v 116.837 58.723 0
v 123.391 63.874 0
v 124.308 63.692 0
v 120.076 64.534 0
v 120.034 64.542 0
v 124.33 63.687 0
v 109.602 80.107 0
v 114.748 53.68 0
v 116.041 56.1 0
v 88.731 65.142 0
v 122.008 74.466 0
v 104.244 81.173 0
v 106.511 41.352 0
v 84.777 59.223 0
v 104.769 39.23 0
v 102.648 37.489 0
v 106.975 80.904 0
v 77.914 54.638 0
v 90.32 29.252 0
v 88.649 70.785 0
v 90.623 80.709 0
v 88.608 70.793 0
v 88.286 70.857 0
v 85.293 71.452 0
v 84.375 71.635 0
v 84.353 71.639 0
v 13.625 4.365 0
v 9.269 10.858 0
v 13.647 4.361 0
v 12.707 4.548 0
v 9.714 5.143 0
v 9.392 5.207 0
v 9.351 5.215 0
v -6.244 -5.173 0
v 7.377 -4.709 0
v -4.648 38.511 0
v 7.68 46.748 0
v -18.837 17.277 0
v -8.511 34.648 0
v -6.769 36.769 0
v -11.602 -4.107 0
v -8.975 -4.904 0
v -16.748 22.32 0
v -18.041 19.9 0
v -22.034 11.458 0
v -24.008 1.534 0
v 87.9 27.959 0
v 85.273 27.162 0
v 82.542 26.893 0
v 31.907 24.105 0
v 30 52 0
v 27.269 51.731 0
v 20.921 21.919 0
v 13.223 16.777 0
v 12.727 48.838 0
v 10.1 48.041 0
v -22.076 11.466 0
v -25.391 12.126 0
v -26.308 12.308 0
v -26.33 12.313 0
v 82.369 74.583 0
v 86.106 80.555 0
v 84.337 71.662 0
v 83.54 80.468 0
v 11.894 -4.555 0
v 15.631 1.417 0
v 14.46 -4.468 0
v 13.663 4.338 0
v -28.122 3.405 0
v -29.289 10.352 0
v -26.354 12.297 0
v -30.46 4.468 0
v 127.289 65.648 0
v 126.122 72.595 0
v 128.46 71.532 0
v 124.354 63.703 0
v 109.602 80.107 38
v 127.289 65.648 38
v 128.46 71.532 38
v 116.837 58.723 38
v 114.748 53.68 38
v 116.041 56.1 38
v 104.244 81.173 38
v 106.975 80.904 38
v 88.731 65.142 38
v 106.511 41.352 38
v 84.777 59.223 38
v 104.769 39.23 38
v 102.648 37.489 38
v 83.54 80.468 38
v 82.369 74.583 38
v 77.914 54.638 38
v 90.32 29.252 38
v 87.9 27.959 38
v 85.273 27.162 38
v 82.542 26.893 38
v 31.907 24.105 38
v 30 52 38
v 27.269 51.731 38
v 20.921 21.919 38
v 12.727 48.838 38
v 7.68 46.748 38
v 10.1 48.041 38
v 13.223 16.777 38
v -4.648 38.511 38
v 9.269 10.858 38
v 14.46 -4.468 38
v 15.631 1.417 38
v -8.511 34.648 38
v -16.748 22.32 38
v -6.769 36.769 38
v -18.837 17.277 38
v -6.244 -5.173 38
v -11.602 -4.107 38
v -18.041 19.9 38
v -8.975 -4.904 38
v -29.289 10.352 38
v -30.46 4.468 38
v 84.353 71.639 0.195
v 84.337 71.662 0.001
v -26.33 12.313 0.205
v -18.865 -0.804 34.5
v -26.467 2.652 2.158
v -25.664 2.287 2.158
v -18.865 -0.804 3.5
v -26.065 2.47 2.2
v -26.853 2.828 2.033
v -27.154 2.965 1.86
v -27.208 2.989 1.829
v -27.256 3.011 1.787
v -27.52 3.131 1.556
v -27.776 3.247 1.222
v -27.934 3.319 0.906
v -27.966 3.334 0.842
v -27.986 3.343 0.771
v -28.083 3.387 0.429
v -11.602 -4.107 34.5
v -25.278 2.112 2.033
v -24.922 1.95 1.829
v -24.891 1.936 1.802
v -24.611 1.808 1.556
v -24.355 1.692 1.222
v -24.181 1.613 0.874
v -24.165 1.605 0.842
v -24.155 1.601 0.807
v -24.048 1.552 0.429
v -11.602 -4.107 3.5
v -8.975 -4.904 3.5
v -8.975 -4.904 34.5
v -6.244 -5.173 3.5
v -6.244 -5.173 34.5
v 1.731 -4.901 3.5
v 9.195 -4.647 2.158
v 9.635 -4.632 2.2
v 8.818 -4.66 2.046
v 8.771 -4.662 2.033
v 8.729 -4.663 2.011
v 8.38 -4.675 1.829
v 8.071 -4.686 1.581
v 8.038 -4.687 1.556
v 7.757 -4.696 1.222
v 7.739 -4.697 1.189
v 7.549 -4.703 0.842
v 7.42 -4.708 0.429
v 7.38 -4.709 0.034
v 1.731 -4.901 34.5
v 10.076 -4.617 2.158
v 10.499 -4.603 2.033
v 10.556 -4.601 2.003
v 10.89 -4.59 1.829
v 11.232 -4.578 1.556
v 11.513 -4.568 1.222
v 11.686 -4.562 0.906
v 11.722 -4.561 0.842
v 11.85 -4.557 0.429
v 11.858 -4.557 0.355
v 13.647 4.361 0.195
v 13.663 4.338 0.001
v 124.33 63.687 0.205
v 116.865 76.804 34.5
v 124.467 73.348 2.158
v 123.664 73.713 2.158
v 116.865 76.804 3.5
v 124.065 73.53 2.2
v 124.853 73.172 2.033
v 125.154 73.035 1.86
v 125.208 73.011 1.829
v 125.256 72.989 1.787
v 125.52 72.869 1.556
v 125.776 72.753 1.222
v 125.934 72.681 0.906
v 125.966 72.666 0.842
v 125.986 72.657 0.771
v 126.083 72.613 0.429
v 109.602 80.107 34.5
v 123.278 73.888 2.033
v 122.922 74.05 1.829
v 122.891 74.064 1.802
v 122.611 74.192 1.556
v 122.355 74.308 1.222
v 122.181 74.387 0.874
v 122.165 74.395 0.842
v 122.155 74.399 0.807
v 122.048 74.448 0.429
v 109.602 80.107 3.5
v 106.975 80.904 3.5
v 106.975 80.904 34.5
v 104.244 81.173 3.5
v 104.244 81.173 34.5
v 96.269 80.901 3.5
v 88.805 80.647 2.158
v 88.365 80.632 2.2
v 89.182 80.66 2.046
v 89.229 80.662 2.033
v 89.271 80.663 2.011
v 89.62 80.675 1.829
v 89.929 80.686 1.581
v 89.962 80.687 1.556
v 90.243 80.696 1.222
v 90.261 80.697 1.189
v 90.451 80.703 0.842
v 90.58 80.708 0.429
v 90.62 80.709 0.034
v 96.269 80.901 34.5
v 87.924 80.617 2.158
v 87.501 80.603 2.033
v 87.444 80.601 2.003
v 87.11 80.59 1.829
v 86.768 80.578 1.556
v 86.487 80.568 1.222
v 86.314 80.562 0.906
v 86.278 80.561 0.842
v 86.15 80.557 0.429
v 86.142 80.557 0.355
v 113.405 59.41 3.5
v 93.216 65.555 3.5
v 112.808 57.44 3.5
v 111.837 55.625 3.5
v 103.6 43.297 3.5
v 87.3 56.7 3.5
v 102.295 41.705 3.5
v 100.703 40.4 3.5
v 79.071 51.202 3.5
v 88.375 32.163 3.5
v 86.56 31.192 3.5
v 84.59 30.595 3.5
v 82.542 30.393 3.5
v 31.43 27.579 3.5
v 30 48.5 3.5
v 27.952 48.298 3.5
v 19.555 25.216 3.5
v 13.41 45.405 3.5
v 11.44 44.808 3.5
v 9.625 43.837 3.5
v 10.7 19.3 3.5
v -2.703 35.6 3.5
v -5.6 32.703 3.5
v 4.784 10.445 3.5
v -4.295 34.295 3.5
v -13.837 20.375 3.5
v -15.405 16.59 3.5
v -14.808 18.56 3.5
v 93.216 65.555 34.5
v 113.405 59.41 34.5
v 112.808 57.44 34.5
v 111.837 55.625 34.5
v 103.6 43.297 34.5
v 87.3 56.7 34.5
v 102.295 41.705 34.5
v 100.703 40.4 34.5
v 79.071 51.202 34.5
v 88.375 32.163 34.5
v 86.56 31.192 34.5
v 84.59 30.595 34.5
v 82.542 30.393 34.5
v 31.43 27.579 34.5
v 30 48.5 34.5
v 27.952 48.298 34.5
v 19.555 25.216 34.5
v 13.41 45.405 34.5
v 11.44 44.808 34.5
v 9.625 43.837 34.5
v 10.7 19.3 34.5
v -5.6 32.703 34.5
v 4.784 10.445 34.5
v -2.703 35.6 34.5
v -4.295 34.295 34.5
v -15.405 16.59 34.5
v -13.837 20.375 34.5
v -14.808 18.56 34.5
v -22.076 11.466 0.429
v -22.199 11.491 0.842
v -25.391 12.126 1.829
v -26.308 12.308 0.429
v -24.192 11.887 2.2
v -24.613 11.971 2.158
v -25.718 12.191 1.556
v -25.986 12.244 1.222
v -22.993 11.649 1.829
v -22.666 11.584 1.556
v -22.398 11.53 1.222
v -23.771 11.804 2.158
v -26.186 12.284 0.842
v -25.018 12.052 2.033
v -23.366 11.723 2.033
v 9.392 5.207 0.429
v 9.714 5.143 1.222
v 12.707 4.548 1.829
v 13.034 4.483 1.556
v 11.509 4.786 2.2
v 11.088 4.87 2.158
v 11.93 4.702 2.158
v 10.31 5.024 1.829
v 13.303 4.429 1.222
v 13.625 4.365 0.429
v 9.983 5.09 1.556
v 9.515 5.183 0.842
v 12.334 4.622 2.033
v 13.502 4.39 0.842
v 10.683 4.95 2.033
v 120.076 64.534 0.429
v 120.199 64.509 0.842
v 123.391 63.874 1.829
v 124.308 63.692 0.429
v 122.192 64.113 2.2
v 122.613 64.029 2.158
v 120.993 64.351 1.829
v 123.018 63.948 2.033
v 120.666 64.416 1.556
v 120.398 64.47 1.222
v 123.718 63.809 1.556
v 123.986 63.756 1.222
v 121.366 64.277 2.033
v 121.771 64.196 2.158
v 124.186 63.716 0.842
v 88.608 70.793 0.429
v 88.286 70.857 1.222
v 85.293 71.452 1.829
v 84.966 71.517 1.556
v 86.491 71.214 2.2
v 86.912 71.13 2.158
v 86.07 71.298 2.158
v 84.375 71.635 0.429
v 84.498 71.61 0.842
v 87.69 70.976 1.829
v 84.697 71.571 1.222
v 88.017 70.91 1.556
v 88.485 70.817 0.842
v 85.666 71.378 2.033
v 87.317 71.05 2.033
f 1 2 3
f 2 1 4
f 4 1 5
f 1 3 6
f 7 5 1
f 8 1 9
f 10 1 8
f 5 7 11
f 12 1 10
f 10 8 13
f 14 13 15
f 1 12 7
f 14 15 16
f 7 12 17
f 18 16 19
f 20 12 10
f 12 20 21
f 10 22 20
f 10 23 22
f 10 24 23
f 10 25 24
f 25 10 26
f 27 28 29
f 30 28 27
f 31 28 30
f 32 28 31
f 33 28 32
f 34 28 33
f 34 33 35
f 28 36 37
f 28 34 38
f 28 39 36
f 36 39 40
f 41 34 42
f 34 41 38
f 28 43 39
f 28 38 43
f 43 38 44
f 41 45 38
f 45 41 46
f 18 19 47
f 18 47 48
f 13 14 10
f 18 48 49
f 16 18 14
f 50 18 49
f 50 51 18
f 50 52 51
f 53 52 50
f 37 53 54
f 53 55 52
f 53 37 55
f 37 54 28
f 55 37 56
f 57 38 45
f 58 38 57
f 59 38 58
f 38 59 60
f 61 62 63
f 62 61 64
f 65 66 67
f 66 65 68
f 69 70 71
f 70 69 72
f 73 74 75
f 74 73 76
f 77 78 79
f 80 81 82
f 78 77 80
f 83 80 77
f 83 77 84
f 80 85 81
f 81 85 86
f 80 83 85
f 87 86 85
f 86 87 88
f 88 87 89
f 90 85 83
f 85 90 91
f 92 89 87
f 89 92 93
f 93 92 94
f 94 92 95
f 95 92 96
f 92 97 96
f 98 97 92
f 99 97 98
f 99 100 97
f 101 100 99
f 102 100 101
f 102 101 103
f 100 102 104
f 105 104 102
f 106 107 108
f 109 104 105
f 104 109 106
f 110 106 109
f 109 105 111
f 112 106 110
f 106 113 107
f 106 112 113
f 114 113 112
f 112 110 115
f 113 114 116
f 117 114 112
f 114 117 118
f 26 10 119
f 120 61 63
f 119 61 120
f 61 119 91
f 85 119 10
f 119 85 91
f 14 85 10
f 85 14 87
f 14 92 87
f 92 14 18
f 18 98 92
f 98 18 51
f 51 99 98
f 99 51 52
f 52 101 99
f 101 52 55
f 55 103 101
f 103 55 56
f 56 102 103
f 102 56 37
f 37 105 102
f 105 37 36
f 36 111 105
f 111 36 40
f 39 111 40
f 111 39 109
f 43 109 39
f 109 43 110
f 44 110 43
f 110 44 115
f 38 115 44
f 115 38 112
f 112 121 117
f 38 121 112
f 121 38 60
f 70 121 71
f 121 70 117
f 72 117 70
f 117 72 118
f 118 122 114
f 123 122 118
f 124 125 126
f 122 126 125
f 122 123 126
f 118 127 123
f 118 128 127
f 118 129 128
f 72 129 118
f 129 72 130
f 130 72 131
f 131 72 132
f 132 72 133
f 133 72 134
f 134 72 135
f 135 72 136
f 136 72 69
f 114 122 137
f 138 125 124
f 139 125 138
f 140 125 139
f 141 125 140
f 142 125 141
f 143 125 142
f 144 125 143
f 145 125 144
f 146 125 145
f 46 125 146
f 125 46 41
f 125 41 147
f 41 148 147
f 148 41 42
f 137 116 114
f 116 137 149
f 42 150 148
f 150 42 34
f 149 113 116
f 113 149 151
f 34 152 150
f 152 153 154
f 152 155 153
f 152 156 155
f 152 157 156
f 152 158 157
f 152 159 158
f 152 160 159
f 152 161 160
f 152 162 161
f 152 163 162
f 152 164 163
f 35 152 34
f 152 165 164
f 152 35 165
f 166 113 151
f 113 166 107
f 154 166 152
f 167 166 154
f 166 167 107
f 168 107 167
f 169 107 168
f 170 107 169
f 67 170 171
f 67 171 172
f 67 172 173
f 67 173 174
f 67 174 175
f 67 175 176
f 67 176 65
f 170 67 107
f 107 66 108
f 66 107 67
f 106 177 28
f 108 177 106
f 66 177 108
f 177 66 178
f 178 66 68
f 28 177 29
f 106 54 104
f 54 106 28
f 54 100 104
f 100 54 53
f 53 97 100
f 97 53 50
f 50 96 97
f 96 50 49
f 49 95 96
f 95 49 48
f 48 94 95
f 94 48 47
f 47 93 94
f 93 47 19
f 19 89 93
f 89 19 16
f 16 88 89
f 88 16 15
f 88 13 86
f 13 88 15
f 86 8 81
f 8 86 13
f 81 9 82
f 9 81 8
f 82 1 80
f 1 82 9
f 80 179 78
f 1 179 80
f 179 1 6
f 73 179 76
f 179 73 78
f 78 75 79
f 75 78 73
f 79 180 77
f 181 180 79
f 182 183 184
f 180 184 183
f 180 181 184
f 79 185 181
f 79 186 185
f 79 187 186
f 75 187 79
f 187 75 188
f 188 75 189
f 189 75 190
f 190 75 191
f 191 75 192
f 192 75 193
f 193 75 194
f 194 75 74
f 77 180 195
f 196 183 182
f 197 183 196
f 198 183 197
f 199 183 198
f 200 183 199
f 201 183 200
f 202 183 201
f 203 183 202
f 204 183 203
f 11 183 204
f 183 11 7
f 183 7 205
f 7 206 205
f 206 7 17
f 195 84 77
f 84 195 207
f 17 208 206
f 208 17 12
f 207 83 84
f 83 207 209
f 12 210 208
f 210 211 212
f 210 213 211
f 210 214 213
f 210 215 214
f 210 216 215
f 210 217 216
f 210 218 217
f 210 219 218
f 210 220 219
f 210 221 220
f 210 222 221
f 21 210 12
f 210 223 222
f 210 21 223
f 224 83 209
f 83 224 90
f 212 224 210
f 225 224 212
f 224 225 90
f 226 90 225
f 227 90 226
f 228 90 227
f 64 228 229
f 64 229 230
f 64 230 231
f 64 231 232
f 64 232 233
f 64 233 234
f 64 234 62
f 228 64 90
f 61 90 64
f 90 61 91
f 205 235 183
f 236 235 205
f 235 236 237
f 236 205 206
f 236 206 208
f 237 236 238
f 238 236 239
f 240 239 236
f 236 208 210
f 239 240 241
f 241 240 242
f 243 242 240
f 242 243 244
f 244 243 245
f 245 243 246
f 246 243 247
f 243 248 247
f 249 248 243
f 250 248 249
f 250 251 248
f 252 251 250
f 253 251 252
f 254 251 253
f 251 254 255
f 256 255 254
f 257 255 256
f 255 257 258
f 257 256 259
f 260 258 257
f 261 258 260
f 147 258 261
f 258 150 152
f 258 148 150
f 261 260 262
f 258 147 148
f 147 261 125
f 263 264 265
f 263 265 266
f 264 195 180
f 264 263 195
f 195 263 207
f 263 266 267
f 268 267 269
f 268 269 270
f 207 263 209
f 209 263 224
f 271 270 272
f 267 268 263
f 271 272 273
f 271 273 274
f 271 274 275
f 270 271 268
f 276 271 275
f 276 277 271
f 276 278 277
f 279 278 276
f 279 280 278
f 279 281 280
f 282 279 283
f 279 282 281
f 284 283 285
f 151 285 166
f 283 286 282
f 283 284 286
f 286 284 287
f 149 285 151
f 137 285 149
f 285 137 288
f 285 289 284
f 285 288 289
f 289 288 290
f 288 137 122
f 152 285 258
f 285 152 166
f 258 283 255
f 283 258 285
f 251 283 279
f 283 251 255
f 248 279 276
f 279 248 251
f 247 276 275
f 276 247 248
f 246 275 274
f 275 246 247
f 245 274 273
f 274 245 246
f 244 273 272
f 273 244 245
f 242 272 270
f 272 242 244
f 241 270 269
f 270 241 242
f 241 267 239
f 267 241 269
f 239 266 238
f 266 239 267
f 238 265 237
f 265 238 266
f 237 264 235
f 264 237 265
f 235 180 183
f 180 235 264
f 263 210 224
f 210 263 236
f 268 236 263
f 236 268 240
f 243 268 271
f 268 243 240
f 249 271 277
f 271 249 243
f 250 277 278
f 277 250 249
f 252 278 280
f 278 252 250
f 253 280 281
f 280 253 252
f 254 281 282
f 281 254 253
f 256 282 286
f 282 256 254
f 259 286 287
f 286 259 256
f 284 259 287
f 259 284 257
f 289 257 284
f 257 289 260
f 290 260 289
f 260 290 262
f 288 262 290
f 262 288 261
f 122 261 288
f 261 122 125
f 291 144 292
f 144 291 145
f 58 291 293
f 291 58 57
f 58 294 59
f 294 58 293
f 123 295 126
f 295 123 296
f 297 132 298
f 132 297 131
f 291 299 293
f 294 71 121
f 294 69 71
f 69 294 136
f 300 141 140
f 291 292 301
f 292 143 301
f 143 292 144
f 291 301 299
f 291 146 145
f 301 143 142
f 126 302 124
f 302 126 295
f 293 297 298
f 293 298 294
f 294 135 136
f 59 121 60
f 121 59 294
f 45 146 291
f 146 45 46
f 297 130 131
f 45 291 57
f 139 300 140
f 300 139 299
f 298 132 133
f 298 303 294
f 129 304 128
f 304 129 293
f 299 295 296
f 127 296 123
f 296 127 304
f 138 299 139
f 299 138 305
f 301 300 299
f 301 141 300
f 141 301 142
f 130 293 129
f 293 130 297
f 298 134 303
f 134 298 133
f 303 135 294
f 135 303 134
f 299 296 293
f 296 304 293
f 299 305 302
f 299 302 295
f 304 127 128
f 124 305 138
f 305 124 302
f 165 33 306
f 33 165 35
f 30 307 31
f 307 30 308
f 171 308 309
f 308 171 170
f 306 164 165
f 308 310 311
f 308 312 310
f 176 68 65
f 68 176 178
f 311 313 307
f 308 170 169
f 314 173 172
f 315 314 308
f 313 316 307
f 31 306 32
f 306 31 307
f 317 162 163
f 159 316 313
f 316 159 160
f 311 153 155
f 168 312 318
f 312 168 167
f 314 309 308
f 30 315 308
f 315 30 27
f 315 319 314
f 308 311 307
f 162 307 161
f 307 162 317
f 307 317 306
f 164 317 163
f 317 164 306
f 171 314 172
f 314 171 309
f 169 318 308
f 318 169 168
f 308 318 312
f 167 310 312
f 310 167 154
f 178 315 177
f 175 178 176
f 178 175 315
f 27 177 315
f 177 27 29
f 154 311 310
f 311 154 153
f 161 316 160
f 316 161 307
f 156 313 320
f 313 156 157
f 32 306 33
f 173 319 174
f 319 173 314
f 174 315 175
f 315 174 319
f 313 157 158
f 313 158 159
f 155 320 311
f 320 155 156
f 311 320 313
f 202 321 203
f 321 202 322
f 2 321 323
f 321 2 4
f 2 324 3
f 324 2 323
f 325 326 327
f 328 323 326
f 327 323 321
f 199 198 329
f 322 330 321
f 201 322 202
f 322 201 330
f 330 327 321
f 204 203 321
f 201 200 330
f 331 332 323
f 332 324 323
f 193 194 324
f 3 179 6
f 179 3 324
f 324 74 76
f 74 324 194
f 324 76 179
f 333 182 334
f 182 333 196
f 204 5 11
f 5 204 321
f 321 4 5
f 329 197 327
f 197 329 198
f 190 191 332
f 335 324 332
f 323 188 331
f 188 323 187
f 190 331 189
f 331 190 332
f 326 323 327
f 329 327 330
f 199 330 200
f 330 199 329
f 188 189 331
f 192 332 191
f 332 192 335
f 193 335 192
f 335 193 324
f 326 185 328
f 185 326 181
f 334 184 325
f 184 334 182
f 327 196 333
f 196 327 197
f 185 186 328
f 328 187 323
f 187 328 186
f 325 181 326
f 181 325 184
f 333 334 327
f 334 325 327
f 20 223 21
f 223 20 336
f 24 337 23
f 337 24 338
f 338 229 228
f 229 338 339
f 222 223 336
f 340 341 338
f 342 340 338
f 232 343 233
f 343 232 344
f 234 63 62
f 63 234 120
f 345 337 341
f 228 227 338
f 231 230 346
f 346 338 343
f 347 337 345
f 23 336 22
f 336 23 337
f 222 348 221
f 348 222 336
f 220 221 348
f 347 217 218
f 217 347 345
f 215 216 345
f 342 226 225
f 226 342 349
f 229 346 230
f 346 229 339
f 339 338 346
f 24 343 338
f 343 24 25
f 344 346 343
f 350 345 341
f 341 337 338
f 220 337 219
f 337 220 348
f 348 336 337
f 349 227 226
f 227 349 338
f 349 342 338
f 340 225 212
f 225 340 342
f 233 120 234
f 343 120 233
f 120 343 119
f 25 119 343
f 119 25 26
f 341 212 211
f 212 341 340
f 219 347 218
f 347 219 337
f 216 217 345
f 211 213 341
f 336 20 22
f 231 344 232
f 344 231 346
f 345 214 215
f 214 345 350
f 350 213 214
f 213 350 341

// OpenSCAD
$fn = 32;

// ----------------------------------------------------------------------
// Air duct: 28 mm duct, 3.5 mm wall, 38 mm across
// ----------------------------------------------------------------------

// --- parameters (mm) ---
duct_r = 14;              // duct core radius
duct_d = 28;              // duct core diameter
wall = 3.5;               // duct wall thickness
height = 38;              // duct width (extrusion height)
port_r = 22.9;            // port flange half width
port_d = 45.8;            // port flange width
port_t = 6;               // port flange thickness
bolt_d = 4.4;             // port bolt holes
bolt_offset = 18.2;       // bolt hole offset from the port axis

difference() {
  /* outer hull chain: tube with a flat flange plate at every port */
  linear_extrude(height = 38) {
    hull() {
      polygon([[14.46, -4.468], [-30.46, 4.468], [-29.289, 10.352], [15.631, 1.417]]);
      translate([-6.244, 8.827]) circle(r = 14);
    }
    hull() {
      translate([-6.244, 8.827]) circle(r = 14);
      translate([-5.107, 14.542]) circle(r = 14);
    }
    hull() {
      translate([-5.107, 14.542]) circle(r = 14);
      translate([3.13, 26.87]) circle(r = 14);
    }
    hull() {
      translate([3.13, 26.87]) circle(r = 14);
      translate([15.458, 35.107]) circle(r = 14);
    }
    hull() {
      translate([15.458, 35.107]) circle(r = 14);
      translate([30, 38]) circle(r = 14);
    }
    hull() {
      translate([30, 38]) circle(r = 14);
      translate([82.542, 40.893]) circle(r = 14);
    }
    hull() {
      translate([82.542, 40.893]) circle(r = 14);
      translate([94.87, 49.13]) circle(r = 14);
    }
    hull() {
      translate([94.87, 49.13]) circle(r = 14);
      translate([103.107, 61.458]) circle(r = 14);
    }
    hull() {
      translate([103.107, 61.458]) circle(r = 14);
      translate([104.244, 67.173]) circle(r = 14);
    }
    hull() {
      translate([104.244, 67.173]) circle(r = 14);
      polygon([[83.54, 80.468], [128.46, 71.532], [127.289, 65.648], [82.369, 74.583]]);
    }
  }
  /* air passage: the same chain inset by the wall, 5 mm proud of the ports */
  translate([0, 0, 3.5]) linear_extrude(height = 31) {
    hull() {
      translate([-8.975, -4.904]) circle(r = 10.5);
      translate([-5.107, 14.542]) circle(r = 10.5);
    }
    hull() {
      translate([-5.107, 14.542]) circle(r = 10.5);
      translate([3.13, 26.87]) circle(r = 10.5);
    }
    hull() {
      translate([3.13, 26.87]) circle(r = 10.5);
      translate([15.458, 35.107]) circle(r = 10.5);
    }
    hull() {
      translate([15.458, 35.107]) circle(r = 10.5);
      translate([30, 38]) circle(r = 10.5);
    }
    hull() {
      translate([30, 38]) circle(r = 10.5);
      translate([82.542, 40.893]) circle(r = 10.5);
    }
    hull() {
      translate([82.542, 40.893]) circle(r = 10.5);
      translate([94.87, 49.13]) circle(r = 10.5);
    }
    hull() {
      translate([94.87, 49.13]) circle(r = 10.5);
      translate([103.107, 61.458]) circle(r = 10.5);
    }
    hull() {
      translate([103.107, 61.458]) circle(r = 10.5);
      translate([106.975, 80.904]) circle(r = 10.5);
    }
  }
  translate([-8, 0]) rotate([0, 0, -11.25]) translate([-18.2, -2.5]) rotate([-90, 0, 0]) cylinder(h = 11, d = 4.4);
  translate([-8, 0]) rotate([0, 0, -11.25]) translate([18.2, -2.5]) rotate([-90, 0, 0]) cylinder(h = 11, d = 4.4);
  translate([106, 76]) rotate([0, 0, 168.75]) translate([-18.2, -2.5]) rotate([-90, 0, 0]) cylinder(h = 11, d = 4.4);
  translate([106, 76]) rotate([0, 0, 168.75]) translate([18.2, -2.5]) rotate([-90, 0, 0]) cylinder(h = 11, d = 4.4);
}
